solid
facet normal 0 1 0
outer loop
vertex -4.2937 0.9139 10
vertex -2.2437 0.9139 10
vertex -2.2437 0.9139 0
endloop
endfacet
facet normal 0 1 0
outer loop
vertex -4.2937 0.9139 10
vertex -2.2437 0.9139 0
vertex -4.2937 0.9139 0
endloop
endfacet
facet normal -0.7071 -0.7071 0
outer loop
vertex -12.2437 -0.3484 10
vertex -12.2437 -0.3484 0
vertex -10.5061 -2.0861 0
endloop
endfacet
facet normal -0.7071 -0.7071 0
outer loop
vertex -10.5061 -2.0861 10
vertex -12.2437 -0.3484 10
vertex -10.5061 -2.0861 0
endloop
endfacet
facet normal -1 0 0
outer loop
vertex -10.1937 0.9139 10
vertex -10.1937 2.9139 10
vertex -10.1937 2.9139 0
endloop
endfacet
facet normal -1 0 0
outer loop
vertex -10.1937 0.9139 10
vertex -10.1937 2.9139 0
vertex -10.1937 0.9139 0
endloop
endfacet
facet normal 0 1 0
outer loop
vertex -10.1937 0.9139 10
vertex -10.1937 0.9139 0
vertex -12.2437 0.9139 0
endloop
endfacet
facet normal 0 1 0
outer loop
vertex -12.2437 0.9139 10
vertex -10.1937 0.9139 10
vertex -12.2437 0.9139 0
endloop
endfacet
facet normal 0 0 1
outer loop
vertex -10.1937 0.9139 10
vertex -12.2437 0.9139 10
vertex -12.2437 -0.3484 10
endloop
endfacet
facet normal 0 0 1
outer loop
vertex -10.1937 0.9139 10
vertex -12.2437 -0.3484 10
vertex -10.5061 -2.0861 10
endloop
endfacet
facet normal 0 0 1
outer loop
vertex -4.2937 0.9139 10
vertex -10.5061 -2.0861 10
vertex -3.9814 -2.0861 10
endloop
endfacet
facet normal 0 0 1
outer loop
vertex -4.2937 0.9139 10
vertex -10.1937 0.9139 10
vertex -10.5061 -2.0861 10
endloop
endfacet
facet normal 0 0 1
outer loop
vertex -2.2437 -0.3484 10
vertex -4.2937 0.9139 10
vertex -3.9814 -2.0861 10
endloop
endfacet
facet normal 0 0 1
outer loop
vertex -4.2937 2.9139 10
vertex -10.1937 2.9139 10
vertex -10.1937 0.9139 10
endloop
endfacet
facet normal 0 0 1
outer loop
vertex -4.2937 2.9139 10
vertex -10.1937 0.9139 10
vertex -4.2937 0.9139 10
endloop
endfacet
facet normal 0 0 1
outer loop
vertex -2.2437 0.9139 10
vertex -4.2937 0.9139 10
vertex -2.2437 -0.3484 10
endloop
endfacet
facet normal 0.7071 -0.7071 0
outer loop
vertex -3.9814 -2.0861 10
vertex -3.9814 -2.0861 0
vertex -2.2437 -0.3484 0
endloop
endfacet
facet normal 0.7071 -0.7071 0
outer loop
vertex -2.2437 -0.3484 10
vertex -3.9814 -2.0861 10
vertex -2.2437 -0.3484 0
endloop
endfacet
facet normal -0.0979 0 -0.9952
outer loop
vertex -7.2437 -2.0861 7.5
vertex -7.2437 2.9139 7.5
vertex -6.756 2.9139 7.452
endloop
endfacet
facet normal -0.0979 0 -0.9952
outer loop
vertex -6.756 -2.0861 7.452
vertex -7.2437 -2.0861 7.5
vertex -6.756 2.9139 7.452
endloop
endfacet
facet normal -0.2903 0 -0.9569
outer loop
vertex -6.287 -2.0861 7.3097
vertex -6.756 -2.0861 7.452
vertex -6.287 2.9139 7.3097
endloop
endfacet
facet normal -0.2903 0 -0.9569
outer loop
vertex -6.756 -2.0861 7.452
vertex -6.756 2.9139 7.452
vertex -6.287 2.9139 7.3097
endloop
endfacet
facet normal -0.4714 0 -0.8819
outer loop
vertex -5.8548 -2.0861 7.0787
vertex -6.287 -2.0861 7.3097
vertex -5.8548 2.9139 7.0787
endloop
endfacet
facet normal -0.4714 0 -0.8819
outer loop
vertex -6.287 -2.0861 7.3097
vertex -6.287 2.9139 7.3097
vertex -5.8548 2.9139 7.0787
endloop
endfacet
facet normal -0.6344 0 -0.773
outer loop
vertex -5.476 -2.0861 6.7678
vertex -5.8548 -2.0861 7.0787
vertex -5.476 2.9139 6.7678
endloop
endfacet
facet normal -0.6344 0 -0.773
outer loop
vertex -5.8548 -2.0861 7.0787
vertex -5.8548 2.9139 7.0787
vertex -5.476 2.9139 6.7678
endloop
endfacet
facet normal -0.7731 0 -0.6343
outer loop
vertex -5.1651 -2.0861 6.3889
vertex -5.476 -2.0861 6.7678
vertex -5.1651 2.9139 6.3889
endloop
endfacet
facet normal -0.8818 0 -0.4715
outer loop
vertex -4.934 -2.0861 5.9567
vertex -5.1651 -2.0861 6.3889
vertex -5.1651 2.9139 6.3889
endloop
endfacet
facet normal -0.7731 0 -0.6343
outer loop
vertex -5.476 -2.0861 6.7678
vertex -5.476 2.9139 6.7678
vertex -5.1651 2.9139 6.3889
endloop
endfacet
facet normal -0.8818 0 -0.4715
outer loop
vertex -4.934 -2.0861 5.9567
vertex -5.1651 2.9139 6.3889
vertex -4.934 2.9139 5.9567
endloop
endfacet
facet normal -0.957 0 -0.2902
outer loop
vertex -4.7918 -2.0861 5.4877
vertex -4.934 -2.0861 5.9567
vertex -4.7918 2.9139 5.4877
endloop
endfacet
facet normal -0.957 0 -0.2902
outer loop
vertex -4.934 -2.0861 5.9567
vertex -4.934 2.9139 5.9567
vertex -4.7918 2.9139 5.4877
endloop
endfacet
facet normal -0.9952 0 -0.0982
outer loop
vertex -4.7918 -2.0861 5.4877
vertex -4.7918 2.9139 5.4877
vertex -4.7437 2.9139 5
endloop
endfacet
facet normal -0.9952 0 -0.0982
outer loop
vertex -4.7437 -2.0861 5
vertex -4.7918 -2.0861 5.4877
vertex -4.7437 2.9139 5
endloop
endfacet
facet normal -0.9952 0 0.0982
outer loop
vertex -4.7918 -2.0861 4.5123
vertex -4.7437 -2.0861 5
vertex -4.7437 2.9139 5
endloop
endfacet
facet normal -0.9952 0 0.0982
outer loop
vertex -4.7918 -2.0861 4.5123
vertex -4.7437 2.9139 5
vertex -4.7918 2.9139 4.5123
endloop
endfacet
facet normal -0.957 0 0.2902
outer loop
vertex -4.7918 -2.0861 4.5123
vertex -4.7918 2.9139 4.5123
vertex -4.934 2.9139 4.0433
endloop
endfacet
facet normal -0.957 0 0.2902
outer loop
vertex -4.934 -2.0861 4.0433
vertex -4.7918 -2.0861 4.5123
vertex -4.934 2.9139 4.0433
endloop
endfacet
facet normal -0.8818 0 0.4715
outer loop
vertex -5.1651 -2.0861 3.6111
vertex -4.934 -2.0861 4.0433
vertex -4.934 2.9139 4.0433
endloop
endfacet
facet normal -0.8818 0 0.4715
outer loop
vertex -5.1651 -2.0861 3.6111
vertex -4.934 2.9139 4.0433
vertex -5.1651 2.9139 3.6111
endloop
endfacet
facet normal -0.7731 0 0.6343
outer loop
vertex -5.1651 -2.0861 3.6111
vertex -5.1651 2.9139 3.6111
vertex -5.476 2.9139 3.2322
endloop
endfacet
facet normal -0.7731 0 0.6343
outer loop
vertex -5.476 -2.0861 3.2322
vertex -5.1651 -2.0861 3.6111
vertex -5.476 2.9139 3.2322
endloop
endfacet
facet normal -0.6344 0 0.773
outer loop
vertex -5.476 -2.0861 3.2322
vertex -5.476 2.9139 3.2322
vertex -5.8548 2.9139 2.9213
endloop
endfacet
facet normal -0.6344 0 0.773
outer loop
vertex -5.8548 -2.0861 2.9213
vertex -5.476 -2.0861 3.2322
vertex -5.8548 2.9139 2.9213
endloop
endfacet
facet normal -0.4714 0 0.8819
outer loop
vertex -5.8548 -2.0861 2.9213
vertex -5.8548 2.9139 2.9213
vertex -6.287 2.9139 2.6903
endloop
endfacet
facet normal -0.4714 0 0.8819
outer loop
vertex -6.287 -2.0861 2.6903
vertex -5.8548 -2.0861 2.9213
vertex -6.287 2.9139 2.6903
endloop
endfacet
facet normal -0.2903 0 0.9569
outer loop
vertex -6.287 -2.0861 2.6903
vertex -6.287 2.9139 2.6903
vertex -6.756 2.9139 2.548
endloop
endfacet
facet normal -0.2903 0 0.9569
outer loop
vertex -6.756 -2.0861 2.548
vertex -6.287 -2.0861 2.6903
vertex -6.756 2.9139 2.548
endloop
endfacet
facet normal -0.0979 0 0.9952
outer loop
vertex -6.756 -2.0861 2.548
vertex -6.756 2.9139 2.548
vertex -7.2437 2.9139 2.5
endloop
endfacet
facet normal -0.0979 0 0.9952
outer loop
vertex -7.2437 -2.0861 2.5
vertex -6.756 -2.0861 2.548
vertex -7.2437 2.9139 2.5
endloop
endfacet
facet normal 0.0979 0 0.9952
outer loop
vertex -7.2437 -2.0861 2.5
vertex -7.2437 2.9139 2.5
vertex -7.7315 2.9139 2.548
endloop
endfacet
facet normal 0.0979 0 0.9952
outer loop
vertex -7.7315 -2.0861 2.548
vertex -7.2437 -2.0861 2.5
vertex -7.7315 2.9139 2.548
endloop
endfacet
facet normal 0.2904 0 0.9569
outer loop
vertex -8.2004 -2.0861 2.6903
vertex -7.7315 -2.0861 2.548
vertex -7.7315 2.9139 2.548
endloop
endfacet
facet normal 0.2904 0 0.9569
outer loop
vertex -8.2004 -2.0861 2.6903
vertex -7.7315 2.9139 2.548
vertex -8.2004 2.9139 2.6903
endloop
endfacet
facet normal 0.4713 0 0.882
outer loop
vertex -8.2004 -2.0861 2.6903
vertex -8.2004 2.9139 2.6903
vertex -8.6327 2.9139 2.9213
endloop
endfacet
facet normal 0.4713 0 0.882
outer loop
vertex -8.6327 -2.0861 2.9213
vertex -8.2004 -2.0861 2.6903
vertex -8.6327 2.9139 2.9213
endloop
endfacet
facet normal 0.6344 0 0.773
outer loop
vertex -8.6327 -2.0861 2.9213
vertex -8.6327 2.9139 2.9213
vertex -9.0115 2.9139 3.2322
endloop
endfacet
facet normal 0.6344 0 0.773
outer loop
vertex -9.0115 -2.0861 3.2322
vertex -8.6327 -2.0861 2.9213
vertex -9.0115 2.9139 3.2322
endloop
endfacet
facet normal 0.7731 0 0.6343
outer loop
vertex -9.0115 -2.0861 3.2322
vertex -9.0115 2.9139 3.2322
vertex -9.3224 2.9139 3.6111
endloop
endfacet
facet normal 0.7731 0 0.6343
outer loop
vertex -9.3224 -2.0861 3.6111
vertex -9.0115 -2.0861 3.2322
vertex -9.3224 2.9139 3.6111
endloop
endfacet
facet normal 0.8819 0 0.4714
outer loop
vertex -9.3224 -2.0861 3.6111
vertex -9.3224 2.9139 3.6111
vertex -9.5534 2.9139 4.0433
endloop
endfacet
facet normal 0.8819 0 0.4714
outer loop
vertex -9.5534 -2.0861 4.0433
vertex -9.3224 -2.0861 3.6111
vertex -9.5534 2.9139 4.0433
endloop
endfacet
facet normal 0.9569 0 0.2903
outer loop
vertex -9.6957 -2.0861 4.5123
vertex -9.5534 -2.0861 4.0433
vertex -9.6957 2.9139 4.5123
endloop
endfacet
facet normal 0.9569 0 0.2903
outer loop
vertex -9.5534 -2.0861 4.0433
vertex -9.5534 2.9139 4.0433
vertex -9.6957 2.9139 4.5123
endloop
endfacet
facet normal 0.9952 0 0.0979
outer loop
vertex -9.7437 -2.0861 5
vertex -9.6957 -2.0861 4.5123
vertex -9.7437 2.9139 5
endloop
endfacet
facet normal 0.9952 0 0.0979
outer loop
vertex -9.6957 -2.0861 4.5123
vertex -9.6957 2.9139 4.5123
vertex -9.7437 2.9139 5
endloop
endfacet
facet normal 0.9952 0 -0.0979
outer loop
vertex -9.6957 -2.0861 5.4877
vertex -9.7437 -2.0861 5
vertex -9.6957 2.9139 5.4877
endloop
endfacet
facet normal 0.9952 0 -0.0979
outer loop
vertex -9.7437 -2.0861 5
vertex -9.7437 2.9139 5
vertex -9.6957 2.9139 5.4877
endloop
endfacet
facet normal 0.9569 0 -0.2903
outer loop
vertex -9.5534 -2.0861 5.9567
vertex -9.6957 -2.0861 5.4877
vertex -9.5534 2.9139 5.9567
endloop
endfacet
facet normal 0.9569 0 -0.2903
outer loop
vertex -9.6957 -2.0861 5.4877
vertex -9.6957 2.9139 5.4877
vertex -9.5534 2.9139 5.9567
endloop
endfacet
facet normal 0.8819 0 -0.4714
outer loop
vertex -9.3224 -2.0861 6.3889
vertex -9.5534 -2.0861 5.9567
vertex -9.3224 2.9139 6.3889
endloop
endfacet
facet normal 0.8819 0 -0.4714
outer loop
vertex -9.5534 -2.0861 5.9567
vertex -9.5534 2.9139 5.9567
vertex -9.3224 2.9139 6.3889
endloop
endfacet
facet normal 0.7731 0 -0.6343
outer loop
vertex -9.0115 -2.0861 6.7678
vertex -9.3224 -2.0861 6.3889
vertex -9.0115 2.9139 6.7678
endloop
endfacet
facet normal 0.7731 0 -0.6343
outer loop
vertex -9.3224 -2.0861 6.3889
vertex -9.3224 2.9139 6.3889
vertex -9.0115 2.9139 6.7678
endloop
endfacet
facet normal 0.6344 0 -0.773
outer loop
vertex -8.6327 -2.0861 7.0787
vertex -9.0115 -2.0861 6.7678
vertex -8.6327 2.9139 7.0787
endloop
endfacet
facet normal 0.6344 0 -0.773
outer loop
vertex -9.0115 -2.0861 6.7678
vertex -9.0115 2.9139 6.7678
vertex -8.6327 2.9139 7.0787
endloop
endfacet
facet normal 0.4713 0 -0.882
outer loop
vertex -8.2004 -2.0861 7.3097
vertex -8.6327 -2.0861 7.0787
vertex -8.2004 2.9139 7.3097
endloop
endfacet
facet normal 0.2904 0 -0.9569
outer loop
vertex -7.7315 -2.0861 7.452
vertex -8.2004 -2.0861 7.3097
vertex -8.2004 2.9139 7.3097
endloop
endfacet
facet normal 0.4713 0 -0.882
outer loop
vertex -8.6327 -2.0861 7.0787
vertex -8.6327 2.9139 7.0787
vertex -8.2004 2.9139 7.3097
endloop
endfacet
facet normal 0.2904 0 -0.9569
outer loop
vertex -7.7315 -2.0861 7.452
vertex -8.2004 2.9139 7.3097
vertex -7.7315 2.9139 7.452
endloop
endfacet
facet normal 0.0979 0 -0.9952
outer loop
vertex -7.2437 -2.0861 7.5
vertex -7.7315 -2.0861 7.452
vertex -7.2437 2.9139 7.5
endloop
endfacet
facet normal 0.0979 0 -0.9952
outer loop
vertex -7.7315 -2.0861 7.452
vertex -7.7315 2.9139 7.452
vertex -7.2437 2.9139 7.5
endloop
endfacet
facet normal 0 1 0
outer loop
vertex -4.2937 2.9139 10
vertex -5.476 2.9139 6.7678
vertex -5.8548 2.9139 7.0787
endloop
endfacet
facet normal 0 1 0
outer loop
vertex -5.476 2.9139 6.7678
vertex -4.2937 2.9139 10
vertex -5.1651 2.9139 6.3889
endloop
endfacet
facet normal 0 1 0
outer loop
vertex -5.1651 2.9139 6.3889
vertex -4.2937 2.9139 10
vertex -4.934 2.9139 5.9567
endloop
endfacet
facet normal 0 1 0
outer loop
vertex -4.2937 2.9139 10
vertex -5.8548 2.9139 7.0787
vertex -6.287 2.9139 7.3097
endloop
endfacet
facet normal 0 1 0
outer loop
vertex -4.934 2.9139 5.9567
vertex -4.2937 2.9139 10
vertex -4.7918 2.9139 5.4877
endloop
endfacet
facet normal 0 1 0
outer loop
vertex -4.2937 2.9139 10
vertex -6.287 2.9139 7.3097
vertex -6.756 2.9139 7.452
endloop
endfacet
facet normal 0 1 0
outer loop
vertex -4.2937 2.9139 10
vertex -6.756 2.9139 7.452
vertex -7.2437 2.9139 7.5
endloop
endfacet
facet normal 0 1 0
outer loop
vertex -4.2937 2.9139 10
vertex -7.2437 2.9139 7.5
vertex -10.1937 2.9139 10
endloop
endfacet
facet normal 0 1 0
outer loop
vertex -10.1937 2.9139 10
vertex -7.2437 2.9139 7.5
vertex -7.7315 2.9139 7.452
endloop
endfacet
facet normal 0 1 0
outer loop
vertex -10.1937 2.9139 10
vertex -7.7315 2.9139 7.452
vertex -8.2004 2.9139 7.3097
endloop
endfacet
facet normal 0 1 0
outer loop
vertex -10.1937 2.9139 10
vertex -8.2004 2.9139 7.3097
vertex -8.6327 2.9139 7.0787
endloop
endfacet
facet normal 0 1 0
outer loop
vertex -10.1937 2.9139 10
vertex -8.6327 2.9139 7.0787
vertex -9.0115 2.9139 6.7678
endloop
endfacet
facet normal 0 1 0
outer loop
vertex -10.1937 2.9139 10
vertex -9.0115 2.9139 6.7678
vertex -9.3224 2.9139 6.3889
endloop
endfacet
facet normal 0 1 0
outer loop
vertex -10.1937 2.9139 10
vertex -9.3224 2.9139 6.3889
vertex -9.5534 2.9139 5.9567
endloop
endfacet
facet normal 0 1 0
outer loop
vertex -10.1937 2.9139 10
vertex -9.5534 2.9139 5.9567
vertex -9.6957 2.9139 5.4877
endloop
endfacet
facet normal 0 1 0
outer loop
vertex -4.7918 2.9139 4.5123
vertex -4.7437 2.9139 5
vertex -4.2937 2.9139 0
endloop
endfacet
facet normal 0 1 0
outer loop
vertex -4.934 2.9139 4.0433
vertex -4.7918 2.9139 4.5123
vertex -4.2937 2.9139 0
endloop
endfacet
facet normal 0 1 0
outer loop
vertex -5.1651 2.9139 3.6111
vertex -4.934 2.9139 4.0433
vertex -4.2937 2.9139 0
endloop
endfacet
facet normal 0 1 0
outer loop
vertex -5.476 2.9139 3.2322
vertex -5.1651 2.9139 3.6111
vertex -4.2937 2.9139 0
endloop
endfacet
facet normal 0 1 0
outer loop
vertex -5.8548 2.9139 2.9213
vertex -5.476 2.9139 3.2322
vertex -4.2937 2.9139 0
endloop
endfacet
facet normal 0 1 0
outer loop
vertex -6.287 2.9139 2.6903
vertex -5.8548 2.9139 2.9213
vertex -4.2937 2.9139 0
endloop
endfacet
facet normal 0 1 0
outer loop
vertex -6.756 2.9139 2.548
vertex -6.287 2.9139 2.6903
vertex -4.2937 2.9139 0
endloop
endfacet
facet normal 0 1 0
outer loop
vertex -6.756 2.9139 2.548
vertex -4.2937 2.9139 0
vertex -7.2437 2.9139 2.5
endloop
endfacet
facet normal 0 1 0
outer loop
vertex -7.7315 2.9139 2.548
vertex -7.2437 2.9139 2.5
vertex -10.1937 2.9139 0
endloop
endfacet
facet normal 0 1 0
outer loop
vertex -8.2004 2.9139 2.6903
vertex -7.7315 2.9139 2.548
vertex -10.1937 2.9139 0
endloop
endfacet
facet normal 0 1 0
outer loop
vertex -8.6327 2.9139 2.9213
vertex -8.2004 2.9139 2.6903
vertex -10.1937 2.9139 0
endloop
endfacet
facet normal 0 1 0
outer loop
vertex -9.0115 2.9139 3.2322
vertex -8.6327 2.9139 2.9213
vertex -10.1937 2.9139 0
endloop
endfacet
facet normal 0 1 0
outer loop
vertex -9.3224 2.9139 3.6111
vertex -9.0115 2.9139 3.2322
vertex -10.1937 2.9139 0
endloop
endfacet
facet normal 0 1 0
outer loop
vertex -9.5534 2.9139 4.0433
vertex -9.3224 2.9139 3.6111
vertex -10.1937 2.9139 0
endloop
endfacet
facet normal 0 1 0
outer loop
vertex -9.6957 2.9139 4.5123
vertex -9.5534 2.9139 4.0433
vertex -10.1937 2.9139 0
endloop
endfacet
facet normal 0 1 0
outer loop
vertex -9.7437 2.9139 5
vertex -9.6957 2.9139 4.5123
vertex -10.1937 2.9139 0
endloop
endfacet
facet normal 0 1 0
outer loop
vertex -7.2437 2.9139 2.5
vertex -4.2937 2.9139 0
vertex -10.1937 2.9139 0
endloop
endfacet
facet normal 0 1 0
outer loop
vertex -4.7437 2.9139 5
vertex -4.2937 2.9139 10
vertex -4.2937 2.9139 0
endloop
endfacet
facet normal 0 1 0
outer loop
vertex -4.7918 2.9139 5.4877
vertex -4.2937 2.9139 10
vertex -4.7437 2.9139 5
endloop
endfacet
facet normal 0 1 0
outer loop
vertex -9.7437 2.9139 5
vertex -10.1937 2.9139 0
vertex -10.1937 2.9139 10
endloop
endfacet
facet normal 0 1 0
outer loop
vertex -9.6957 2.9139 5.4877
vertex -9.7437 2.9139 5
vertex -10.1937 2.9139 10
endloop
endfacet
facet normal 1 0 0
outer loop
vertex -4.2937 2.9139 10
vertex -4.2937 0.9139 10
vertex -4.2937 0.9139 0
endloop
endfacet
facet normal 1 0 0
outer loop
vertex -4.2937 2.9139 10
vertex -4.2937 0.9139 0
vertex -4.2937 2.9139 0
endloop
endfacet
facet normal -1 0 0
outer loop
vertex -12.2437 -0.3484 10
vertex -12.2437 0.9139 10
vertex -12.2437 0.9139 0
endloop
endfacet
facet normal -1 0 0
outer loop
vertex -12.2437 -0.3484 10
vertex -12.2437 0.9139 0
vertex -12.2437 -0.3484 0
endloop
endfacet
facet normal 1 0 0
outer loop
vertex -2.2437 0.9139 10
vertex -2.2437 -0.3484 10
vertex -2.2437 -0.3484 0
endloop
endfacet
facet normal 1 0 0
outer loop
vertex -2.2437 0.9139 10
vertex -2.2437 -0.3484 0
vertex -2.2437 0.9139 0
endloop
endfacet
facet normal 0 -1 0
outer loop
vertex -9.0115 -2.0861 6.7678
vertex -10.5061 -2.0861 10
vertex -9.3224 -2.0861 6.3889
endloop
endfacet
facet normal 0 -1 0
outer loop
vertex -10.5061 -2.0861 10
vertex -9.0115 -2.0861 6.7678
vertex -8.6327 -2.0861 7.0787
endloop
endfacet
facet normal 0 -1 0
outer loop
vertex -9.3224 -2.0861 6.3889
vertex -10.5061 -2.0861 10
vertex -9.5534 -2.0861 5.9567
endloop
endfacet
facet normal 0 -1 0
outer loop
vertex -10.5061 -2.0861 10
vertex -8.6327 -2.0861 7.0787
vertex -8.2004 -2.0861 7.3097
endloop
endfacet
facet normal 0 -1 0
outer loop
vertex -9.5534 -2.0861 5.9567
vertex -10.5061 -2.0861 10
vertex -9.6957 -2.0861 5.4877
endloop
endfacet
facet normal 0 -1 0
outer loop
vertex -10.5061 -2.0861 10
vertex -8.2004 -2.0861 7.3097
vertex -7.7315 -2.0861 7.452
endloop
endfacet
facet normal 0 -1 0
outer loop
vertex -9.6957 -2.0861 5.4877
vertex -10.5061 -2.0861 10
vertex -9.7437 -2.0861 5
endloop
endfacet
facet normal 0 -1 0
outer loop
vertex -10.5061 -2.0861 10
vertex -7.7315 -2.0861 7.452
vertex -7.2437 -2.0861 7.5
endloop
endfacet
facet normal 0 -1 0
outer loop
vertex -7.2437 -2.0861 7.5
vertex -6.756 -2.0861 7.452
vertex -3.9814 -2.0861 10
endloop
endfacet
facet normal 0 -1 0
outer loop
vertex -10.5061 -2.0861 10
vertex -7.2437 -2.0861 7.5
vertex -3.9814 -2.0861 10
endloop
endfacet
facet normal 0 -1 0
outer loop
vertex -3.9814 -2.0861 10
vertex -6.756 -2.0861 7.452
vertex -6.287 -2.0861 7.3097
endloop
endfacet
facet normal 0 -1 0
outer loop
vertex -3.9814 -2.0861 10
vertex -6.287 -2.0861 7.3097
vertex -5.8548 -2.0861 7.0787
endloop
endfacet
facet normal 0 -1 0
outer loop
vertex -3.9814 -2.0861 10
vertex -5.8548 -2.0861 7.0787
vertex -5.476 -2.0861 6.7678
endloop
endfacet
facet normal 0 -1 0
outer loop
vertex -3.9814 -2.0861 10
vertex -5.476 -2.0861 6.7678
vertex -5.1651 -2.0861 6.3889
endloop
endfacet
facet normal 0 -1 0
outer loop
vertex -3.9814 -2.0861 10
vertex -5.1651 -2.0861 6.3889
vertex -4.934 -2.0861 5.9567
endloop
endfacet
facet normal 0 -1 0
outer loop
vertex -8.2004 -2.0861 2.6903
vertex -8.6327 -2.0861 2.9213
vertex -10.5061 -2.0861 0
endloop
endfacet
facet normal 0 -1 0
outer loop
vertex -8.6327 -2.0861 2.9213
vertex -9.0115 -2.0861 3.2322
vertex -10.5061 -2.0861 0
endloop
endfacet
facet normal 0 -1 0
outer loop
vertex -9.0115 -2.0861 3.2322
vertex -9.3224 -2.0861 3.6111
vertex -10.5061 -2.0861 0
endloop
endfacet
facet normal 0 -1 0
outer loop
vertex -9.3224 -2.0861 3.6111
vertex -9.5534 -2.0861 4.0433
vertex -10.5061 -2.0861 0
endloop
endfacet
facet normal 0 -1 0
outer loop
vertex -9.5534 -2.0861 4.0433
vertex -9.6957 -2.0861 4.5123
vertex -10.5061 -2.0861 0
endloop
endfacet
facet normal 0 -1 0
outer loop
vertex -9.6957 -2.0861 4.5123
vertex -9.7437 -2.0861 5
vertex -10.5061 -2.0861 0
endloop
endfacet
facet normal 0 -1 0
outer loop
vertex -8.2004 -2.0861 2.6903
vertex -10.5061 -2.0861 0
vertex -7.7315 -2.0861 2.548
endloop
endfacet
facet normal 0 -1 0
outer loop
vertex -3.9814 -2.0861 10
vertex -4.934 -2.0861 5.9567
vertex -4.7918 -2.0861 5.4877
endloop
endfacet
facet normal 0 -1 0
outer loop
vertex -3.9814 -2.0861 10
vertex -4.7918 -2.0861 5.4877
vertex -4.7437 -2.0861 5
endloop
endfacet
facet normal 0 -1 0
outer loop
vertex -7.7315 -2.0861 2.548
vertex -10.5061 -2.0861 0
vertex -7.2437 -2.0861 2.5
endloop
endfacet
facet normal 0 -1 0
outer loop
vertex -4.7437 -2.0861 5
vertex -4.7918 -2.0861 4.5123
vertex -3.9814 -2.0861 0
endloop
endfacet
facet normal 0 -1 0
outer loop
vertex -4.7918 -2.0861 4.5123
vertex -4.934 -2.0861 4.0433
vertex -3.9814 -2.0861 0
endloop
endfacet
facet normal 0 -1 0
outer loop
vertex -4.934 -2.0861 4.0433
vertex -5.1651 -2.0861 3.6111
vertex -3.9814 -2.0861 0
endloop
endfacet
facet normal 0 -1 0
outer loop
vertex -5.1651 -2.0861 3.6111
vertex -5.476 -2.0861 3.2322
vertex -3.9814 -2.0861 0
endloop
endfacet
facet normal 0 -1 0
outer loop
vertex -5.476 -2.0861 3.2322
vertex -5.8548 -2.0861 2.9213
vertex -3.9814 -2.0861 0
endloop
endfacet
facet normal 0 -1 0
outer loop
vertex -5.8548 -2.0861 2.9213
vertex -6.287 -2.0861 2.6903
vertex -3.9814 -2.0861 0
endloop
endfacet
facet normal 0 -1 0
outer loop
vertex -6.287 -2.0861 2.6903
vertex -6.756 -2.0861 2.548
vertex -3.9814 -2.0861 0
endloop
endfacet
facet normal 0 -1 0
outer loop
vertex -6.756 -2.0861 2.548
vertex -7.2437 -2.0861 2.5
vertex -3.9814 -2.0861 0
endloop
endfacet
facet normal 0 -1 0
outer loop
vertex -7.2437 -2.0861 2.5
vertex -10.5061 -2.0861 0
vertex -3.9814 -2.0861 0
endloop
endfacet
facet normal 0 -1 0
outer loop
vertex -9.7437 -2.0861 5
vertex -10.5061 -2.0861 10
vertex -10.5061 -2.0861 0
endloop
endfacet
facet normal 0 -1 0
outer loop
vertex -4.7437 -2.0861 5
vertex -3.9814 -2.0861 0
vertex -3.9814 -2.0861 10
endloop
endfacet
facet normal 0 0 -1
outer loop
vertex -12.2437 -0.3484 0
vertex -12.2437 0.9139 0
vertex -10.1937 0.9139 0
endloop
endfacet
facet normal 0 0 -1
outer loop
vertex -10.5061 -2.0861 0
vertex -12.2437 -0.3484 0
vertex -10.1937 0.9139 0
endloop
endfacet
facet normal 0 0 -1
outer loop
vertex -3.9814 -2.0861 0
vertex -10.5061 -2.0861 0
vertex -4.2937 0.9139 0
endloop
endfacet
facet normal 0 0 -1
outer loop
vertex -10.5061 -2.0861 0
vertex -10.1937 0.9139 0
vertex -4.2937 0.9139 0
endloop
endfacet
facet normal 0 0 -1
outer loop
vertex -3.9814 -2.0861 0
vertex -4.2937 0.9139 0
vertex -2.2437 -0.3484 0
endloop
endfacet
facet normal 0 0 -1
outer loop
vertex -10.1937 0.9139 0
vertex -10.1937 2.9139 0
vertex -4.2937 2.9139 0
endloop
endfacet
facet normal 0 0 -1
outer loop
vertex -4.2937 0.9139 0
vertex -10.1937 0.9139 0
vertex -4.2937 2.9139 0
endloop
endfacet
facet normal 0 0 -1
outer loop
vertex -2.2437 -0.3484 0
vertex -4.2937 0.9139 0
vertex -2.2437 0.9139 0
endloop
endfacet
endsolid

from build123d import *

# Parameters (mm, degrees)
BOSS_EXTRU_1_DEPTH      = 10
ENL_V_MAT_EXTRU_1_REACH = 18.58
ESQUISSE2_R             = 2.5


with BuildPart() as part:
    # Esquisse1 → Boss.-Extru.1 (new body)
    with BuildSketch(Plane.XY):
        Polygon((-10.506087259, -2.086075409), (-3.981368971, -2.086075409), (-2.243728115, -0.348434553), (-2.243728115, 0.913924591), (-4.293728115, 0.913924591), (-4.293728115, 2.913924591), (-10.193728115, 2.913924591), (-10.193728115, 0.913924591), (-12.243728115, 0.913924591), (-12.243728115, -0.348434553), align=None)
    extrude(amount=BOSS_EXTRU_1_DEPTH)

    # Esquisse2 → Enlèv. mat.-Extru.1 (cut, up to next)
    with BuildSketch(Plane(origin=(0, 2.913924591, 0), x_dir=(1, 0, 0), z_dir=(0, 1, 0)), mode=Mode.PRIVATE) as enl_v_mat_extru_1_sk1:
        with Locations(Location((-7.243728115, -5, 0), (0, 0, 270))):
            Circle(ESQUISSE2_R)
    enl_v_mat_extru_1_tool1 = extrude(enl_v_mat_extru_1_sk1.sketch, amount=-ENL_V_MAT_EXTRU_1_REACH, mode=Mode.PRIVATE) & part.part
    add(enl_v_mat_extru_1_tool1.solids().sort_by_distance((-7.243728, 2.913925, 5))[0], mode=Mode.SUBTRACT)


solid = part.part
